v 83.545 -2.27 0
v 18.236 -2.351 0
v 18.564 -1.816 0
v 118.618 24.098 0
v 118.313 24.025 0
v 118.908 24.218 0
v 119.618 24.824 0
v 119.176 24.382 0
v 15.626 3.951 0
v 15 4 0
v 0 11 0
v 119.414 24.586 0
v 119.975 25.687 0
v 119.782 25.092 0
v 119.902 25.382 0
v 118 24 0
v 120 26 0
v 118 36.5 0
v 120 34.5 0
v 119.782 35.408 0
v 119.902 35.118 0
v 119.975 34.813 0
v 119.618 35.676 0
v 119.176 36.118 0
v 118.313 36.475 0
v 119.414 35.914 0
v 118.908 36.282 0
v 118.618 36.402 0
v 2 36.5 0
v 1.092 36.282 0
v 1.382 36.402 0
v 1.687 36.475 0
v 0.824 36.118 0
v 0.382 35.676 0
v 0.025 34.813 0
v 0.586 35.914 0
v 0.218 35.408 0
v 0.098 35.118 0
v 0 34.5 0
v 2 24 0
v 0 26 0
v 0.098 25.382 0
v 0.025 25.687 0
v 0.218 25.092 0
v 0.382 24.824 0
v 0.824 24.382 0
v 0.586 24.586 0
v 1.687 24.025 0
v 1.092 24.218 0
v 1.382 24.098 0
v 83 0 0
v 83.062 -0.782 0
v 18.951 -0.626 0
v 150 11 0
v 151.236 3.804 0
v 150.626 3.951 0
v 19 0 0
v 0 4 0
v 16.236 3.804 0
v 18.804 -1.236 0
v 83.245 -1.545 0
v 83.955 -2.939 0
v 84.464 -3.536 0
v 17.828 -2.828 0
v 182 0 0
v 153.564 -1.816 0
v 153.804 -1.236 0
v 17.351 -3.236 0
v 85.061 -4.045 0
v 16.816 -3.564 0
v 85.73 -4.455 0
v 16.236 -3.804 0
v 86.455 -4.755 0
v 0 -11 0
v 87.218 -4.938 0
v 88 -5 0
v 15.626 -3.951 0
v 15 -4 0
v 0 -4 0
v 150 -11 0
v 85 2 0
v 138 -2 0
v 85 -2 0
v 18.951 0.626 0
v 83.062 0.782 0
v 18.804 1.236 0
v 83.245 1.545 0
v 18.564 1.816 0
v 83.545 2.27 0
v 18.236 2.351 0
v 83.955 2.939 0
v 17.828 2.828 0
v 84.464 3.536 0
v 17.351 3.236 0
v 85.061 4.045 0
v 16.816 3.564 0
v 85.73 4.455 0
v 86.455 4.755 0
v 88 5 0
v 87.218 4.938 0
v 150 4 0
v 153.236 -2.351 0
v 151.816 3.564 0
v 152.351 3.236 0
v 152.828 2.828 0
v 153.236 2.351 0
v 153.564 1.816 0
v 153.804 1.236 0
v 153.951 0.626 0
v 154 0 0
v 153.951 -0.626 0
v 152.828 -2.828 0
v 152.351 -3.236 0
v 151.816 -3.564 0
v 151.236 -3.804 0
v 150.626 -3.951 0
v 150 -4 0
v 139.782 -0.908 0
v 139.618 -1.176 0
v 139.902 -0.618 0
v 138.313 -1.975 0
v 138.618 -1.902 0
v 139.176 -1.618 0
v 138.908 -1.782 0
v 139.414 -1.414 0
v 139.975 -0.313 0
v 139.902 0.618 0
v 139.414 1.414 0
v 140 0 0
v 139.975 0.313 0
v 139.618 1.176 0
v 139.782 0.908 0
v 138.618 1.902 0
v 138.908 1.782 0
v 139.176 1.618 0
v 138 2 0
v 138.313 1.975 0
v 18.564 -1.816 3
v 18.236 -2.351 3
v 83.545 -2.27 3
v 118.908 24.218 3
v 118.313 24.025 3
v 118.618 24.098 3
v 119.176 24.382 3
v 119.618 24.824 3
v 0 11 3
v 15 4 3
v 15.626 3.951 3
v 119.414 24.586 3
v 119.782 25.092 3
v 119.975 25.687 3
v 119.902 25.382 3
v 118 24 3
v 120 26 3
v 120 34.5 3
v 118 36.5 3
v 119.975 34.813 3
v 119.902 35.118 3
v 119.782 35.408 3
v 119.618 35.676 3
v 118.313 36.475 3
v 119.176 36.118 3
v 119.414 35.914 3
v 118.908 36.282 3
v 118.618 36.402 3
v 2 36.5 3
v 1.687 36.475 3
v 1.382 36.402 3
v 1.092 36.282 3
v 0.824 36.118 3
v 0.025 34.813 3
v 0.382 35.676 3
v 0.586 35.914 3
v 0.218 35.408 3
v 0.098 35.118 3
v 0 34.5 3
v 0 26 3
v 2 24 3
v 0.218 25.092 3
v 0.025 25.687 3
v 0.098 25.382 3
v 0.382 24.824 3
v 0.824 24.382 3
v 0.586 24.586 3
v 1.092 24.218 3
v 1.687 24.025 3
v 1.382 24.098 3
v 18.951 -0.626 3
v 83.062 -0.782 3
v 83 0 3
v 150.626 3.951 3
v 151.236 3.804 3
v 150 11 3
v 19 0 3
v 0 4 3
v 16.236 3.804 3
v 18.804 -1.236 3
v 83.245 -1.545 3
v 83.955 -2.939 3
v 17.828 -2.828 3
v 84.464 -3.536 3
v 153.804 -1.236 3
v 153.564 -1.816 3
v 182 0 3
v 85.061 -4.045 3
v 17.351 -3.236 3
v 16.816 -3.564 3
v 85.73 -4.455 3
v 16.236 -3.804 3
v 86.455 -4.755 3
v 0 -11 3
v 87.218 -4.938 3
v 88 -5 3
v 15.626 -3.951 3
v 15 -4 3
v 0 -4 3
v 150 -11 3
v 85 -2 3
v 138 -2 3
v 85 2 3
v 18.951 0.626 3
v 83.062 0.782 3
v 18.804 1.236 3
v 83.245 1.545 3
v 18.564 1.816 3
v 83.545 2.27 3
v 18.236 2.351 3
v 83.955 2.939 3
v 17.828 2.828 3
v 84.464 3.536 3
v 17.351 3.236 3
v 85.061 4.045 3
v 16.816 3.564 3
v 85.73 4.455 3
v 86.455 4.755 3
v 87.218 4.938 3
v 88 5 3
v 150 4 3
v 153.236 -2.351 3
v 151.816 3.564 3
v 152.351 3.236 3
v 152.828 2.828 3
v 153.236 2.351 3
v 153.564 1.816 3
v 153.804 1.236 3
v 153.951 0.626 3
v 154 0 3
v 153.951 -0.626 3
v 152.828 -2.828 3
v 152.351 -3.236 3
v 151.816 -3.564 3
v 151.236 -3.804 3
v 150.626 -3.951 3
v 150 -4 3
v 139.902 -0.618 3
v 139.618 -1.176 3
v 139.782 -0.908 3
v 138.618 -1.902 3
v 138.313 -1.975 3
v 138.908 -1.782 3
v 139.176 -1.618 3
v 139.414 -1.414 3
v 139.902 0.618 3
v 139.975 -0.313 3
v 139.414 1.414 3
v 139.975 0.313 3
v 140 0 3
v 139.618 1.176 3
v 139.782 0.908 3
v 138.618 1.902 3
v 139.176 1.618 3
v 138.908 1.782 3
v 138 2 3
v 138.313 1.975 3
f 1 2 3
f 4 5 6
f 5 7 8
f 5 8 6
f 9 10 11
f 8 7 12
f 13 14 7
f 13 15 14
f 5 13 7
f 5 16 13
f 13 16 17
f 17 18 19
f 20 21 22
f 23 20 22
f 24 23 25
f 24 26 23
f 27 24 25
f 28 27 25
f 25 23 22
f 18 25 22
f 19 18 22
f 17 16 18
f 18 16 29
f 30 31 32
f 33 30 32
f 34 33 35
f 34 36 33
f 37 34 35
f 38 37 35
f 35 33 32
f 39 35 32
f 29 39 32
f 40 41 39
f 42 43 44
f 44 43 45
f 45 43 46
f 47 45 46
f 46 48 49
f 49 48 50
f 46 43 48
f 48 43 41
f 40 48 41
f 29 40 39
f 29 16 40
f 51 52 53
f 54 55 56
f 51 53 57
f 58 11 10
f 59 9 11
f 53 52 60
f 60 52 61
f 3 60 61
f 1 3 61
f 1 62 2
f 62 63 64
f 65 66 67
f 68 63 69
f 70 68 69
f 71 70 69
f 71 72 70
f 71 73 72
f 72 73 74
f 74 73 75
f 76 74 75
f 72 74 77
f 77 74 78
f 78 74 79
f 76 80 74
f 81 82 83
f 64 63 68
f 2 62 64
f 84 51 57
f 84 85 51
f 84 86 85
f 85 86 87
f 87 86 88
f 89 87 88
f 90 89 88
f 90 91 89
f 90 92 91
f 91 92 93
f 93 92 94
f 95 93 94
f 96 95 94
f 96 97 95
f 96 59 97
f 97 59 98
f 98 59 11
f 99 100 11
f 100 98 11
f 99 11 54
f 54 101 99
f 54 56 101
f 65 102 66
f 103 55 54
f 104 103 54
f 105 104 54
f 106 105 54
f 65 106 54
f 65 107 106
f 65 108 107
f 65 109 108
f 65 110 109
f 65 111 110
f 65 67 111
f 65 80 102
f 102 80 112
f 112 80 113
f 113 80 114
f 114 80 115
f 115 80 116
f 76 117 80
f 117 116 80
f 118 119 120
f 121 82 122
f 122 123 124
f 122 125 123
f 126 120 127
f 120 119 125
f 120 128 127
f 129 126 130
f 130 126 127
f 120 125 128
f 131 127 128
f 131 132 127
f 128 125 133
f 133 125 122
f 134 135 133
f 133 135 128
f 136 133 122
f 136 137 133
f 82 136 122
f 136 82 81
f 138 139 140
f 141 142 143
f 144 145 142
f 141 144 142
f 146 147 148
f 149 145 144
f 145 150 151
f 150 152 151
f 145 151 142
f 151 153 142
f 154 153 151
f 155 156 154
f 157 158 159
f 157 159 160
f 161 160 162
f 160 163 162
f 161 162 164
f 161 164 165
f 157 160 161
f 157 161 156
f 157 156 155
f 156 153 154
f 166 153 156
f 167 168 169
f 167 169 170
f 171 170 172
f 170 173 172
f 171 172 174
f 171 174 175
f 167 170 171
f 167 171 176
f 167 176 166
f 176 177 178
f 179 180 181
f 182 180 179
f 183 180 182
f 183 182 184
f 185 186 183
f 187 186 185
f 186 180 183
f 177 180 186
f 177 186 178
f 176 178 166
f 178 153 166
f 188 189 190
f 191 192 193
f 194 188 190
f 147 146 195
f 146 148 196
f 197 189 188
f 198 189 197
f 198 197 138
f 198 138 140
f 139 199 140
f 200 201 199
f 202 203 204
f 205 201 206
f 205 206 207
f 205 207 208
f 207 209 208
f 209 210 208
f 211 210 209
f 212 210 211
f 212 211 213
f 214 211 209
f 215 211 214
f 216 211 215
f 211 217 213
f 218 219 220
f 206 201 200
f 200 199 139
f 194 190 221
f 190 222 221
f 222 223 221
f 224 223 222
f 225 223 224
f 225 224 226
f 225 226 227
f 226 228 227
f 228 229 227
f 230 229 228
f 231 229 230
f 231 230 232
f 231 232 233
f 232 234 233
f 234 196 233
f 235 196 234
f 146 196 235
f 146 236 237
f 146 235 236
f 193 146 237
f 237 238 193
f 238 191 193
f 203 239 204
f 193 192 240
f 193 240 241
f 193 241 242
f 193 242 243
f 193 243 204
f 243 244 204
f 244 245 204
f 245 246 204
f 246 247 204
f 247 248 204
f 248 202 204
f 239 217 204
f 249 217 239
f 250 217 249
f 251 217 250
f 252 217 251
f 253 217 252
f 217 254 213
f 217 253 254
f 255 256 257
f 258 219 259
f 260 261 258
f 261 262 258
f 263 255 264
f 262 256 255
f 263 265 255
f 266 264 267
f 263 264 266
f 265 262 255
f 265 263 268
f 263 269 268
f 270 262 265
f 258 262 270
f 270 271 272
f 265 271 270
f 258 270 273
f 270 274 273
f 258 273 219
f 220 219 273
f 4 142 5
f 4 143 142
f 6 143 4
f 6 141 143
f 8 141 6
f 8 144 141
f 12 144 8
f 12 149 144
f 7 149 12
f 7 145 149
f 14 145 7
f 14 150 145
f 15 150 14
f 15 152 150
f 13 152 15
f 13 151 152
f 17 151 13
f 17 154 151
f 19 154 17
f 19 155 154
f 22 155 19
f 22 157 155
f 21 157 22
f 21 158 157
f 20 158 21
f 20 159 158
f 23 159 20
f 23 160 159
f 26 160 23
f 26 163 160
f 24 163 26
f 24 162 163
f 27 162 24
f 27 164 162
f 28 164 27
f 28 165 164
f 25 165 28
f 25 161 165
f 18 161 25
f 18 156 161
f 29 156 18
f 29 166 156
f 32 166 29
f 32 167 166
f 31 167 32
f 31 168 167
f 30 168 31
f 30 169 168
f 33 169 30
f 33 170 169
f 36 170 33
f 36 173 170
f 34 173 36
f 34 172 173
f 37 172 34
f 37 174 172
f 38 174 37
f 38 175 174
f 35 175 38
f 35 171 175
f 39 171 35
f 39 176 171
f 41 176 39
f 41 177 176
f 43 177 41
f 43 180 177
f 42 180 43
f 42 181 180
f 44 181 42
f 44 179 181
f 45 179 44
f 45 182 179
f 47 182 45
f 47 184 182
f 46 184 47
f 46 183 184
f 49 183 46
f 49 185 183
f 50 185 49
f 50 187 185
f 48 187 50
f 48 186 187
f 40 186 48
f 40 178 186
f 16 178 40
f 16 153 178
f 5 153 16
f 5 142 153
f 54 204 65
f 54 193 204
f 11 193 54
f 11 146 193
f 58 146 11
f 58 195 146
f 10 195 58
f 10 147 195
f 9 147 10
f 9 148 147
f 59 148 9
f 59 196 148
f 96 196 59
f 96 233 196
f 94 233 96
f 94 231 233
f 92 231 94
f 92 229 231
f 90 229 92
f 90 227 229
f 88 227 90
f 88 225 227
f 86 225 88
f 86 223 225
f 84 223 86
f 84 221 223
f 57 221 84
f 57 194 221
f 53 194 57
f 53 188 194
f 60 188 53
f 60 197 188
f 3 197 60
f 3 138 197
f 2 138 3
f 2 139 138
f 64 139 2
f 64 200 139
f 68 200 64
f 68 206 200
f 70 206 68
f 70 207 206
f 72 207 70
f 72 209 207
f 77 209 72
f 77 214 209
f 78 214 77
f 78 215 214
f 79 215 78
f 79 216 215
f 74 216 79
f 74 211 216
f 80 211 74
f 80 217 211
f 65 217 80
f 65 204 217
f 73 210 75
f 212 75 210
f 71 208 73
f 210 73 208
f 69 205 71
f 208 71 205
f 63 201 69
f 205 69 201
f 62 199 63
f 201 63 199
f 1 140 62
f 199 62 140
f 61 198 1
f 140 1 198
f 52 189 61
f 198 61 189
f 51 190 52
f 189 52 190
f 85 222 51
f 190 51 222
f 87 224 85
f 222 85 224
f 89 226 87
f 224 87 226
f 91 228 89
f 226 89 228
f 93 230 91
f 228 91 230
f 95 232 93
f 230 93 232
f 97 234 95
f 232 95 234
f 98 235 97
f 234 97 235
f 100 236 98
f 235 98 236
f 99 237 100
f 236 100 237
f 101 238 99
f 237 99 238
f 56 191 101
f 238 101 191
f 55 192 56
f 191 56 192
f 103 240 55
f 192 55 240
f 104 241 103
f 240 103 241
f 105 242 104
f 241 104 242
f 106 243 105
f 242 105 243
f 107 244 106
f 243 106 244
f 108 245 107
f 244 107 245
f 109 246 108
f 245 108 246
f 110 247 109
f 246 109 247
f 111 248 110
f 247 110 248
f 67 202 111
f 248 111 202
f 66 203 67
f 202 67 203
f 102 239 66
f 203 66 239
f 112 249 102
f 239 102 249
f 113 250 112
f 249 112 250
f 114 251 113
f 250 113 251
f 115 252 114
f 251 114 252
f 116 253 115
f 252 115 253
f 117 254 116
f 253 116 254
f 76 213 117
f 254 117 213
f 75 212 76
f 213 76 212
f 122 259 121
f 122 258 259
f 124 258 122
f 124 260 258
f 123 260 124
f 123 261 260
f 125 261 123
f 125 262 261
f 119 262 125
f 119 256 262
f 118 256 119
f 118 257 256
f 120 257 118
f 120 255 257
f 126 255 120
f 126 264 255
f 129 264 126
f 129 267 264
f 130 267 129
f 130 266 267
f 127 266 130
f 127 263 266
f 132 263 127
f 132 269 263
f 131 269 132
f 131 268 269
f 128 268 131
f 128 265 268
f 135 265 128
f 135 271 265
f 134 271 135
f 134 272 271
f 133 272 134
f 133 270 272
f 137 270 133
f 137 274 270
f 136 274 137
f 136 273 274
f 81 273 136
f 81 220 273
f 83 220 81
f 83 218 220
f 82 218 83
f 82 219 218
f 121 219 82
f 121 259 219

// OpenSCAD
// @title Net-Making Needle and Mesh Gauge
// @category Food & Fishing
// @material Any
// @print Flat, 3 perimeters, 100% infill (thin part)
// @summary Shuttle and gauge for knotting fishing nets, gill nets, cargo nets, hammocks and bags from cord or unraveled rope.
// @use Wind cord around the tongue and through the tail fork. Wrap each loop over the gauge so every mesh is the same size, tie with a sheet bend (netting knot). See Knots and Food > Fishing.
// @variant 25mm mesh | -D gauge=25
// @variant 40mm mesh | -D gauge=40

gauge = 25; t = 3; $fn = 40;
linear_extrude(t) {
  difference() {
    polygon([[0,-11],[150,-11],[182,0],[150,11],[0,11]]);
    hull() { translate([88,0]) circle(r=5); translate([150,0]) circle(r=4); }
    translate([-1,-4]) square([16,8]);
    translate([15,0]) circle(r=4);
  }
  hull() { translate([85,-2]) square([2,4]); translate([138,0]) circle(r=2); }
  // gauge
  translate([0,24]) offset(r=2) offset(delta=-2) square([120, gauge/2]);
}
